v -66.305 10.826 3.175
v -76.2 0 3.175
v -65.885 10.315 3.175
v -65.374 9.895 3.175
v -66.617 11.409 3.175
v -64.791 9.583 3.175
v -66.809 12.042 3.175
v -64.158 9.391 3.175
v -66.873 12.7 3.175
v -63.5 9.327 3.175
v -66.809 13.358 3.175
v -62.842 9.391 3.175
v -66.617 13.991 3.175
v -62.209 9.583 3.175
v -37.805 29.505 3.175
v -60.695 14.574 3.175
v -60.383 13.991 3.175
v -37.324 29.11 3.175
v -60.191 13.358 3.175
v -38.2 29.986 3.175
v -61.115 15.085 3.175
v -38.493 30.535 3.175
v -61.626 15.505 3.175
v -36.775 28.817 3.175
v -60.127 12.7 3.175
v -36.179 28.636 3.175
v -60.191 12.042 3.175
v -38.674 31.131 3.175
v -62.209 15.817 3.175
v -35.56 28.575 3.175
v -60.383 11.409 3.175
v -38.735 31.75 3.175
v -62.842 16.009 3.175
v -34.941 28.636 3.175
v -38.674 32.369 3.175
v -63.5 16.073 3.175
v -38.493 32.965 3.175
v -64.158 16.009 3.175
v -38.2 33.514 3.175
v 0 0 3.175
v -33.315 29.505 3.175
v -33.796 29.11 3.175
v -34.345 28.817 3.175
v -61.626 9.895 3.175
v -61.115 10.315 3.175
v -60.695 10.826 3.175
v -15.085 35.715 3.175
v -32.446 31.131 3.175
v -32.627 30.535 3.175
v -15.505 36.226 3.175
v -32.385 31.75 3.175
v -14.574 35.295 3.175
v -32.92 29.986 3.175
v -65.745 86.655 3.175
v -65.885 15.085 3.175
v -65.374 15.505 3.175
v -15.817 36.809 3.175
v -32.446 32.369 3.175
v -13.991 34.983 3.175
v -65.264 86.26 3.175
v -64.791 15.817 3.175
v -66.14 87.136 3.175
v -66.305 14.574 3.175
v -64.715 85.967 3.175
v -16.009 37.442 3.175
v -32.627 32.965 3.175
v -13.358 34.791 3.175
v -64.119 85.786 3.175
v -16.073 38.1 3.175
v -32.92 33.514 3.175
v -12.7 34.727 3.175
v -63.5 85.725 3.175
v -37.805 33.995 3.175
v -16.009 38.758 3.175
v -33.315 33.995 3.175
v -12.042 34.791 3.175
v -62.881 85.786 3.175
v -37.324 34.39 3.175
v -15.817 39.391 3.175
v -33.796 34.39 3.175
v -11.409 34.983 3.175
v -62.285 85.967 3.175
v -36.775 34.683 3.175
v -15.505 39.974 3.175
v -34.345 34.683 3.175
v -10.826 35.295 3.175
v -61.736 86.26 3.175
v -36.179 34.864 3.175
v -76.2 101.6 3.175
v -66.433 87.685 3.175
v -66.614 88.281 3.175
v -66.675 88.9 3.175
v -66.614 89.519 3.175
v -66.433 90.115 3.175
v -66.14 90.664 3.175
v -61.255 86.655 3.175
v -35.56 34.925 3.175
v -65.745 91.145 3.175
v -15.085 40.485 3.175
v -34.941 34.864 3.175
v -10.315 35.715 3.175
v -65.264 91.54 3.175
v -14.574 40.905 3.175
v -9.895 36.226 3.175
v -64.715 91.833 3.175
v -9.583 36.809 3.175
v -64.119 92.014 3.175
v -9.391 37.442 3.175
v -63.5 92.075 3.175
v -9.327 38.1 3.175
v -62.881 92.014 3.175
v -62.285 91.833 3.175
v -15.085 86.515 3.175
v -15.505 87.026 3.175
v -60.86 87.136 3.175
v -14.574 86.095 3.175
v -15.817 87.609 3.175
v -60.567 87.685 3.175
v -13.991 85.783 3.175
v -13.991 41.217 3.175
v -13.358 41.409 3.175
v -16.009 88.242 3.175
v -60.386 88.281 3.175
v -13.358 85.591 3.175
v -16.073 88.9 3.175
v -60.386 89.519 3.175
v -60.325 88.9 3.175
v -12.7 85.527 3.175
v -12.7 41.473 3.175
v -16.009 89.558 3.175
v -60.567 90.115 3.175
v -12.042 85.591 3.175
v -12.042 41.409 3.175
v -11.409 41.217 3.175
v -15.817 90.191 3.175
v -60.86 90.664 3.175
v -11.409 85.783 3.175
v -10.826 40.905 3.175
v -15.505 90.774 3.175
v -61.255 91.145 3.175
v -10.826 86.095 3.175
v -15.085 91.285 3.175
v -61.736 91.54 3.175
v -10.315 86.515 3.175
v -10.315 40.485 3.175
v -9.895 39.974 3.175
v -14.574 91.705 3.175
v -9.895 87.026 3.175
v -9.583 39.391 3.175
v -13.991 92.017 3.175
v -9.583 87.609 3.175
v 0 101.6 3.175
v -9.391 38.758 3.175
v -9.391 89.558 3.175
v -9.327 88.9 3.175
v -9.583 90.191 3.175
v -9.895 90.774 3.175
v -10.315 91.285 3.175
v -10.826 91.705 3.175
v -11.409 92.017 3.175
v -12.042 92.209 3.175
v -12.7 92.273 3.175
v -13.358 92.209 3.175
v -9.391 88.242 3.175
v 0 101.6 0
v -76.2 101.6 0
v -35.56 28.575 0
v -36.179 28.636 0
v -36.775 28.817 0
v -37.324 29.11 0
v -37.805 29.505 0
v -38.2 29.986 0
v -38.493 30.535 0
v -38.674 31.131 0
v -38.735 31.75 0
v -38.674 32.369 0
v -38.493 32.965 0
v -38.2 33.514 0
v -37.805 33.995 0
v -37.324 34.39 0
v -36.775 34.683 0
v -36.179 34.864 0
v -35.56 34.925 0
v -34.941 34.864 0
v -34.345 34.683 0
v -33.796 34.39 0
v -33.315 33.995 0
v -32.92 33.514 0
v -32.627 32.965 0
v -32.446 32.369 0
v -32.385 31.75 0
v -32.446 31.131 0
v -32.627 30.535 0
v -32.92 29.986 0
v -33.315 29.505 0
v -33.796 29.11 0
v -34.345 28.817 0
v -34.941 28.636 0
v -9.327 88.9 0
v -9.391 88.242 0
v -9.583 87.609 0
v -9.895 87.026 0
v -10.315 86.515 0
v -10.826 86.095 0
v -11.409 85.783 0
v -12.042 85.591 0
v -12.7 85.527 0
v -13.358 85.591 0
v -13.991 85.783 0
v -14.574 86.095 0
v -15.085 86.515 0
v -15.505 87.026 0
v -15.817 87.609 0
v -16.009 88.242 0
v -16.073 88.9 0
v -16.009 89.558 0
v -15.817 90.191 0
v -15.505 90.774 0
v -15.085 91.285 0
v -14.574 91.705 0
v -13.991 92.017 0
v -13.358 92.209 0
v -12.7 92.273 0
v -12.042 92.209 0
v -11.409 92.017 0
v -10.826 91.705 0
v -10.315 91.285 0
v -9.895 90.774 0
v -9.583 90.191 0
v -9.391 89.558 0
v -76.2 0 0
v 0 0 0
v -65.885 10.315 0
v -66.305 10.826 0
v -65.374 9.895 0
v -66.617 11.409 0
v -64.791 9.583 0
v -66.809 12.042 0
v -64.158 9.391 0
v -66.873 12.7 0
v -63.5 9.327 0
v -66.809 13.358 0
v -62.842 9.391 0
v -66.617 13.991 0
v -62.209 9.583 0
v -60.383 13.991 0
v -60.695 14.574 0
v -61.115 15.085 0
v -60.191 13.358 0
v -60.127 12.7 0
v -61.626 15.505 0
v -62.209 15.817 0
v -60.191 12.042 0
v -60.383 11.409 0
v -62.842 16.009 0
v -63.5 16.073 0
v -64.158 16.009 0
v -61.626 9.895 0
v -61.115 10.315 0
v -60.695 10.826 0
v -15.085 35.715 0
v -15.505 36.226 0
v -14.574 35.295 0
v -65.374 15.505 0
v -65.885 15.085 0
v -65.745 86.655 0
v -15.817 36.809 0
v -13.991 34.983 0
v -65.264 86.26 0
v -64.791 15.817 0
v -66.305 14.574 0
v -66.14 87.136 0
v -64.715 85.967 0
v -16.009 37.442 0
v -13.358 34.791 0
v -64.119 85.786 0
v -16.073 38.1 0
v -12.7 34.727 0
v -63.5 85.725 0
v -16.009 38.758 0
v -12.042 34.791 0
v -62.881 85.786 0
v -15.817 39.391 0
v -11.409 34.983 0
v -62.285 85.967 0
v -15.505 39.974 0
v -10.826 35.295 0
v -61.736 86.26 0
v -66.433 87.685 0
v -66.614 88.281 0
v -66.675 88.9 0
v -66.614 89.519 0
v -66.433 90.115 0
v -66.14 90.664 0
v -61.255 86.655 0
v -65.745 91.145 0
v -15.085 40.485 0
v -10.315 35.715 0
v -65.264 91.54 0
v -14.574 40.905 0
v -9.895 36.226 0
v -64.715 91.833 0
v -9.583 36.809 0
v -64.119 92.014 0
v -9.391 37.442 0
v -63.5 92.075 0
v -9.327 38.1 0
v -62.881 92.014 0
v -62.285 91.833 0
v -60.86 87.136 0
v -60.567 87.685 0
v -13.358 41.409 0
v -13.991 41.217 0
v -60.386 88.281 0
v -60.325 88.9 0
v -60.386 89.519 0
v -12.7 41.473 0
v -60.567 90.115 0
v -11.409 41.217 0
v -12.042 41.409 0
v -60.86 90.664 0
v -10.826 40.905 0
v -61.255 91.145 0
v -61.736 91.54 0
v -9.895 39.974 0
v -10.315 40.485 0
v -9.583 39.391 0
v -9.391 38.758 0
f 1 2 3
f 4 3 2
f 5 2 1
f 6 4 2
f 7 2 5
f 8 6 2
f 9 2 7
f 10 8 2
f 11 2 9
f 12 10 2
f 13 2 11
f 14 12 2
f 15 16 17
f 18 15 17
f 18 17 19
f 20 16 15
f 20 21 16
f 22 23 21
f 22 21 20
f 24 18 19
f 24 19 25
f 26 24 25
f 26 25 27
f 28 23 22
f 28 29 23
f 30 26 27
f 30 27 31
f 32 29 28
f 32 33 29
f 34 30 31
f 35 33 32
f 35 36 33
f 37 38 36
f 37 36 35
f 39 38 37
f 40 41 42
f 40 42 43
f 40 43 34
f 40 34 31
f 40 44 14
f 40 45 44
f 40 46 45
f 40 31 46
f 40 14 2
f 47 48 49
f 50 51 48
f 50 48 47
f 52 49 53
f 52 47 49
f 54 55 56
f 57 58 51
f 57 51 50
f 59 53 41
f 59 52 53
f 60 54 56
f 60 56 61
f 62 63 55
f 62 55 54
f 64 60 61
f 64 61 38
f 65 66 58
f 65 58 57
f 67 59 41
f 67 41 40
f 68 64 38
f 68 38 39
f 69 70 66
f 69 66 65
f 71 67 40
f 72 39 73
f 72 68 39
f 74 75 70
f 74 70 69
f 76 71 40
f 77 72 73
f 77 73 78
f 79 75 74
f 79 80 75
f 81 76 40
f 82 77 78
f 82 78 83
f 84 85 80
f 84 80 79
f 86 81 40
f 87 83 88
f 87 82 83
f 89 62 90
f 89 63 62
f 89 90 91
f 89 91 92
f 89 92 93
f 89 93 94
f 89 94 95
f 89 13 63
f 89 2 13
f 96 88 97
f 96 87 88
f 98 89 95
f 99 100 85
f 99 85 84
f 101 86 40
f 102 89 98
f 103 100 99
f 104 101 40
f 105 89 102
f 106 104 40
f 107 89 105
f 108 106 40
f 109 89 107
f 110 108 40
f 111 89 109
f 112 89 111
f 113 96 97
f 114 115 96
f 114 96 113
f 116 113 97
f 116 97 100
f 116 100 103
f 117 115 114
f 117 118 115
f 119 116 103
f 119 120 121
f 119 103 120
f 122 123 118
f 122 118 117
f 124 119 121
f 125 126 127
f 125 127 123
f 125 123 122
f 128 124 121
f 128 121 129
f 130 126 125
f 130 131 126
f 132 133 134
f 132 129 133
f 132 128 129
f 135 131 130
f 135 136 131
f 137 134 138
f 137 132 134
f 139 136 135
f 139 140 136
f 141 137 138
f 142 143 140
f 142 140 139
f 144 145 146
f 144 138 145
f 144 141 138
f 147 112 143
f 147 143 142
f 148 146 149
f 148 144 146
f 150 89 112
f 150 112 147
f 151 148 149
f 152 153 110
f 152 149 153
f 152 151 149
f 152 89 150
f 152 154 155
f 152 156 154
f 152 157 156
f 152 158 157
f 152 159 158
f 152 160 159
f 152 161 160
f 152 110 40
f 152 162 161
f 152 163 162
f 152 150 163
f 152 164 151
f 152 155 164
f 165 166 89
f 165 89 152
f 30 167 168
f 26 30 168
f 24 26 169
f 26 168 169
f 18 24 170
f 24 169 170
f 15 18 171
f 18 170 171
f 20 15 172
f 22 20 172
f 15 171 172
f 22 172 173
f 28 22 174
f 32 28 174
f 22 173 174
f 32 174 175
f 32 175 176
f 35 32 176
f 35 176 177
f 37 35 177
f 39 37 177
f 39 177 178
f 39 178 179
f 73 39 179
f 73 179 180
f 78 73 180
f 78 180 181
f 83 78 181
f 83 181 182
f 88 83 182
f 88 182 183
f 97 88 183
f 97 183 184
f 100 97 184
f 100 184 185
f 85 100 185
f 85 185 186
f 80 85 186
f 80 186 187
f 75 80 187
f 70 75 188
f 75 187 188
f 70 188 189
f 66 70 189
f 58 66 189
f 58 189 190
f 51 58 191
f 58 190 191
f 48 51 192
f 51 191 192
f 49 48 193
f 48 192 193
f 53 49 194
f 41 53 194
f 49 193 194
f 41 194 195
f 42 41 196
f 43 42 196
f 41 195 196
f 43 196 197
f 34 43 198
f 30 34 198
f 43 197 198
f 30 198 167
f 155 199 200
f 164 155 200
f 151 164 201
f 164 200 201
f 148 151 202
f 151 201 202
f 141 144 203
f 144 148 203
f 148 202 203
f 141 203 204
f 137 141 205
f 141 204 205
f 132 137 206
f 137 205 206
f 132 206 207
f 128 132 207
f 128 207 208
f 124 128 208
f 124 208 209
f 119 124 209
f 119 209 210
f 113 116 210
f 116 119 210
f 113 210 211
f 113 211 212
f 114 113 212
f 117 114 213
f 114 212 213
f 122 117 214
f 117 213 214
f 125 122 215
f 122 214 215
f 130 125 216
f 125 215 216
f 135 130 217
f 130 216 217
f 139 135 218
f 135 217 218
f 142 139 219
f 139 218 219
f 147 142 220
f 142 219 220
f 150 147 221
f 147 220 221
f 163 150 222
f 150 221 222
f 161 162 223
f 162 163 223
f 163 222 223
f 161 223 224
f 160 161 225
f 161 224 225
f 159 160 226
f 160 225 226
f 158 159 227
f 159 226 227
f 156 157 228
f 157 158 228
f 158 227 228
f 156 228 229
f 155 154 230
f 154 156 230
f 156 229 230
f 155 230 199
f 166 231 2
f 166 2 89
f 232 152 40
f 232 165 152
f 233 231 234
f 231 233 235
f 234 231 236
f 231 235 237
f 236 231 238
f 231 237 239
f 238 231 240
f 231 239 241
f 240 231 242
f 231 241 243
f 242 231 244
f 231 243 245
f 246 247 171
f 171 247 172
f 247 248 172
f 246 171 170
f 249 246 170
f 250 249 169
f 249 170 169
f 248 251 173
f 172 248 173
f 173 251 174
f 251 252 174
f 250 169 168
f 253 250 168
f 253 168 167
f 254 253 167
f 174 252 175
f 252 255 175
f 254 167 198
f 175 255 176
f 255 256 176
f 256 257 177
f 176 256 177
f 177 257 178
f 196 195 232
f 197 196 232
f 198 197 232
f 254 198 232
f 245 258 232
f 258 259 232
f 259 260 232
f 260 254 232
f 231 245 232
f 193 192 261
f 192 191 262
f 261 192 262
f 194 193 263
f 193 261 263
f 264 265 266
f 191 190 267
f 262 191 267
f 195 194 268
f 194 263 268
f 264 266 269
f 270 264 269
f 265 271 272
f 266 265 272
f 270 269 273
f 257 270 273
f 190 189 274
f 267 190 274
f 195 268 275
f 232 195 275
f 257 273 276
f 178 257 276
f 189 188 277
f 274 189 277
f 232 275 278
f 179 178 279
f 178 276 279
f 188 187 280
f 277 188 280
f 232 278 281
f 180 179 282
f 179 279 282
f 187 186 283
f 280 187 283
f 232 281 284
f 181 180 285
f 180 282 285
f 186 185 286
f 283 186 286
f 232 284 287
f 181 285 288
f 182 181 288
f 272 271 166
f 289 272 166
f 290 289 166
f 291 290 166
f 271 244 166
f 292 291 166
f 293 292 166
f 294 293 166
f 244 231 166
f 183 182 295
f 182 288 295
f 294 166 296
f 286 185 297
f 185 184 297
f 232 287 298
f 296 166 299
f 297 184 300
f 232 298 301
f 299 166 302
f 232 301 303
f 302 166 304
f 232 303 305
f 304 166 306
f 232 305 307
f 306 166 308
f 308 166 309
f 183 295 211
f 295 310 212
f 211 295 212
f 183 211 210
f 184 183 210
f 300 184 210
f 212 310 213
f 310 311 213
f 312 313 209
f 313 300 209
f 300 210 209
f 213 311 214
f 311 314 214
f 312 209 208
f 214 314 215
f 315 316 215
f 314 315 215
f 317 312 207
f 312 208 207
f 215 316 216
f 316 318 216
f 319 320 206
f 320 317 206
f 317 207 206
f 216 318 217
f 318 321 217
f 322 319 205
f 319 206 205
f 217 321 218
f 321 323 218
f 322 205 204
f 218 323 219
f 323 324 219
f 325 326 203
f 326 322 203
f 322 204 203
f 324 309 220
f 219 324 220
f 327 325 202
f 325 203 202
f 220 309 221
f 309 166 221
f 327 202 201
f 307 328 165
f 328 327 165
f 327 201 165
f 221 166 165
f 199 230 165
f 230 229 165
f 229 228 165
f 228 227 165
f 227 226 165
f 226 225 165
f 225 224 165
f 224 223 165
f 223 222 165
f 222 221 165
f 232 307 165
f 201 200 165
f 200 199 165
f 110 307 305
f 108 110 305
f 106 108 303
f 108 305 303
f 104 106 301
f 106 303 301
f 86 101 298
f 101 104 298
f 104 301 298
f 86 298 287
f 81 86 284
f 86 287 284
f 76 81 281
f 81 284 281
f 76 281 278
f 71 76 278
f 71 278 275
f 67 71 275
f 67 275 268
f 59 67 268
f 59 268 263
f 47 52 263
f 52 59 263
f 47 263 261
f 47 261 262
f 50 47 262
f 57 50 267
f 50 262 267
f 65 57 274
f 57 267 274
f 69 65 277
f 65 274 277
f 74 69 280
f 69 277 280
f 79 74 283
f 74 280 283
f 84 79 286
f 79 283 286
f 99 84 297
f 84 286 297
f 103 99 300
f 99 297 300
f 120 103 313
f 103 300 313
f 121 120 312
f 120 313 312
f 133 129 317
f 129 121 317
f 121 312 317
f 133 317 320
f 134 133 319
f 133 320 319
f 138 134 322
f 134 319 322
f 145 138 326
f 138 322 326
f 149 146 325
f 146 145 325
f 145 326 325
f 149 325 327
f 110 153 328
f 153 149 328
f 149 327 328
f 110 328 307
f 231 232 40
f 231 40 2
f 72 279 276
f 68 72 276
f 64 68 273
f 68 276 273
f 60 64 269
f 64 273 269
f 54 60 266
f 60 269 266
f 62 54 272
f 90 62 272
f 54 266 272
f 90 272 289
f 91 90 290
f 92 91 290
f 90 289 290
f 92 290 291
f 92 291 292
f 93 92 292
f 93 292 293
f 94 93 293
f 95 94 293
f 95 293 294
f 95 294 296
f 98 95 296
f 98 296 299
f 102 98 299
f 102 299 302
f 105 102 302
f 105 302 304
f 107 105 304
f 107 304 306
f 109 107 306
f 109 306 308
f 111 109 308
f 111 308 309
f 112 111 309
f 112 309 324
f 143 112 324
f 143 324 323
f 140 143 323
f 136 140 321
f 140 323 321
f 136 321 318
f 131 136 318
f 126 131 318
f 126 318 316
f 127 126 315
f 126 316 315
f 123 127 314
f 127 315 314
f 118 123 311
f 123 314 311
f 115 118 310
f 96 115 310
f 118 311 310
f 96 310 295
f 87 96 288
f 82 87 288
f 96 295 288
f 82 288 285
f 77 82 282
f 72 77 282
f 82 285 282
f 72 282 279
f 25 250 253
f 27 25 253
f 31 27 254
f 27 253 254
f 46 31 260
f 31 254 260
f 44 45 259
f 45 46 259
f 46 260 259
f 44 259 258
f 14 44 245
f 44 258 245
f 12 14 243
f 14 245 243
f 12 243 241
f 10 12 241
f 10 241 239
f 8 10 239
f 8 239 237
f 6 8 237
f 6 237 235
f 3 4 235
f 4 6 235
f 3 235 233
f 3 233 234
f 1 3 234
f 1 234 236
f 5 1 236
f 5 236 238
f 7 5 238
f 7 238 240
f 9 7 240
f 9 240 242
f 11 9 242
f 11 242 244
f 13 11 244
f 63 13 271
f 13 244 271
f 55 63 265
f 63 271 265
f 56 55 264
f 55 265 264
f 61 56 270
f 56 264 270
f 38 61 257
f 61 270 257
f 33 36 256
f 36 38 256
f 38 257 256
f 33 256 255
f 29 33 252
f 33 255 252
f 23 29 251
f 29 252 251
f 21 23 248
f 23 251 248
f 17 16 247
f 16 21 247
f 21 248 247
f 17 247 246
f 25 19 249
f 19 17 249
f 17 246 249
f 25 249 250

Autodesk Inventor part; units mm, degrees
ref_plane "YZ Plane" through (0, 0, 0) normal (1, 0, 0) x (0, 1, 0)
ref_plane "XZ Plane" through (0, 0, 0) normal (0, 1, 0) x (-1, 0, 0)
ref_plane "XY Plane" through (0, 0, 0) normal (0, 0, 1) x (1, 0, 0)
sketch "Sketch1" plane through (0, 0, 0) normal (0, 0, 1) x (1, 0, 0)
  line L0 (0, 0) -> (-76.2, 0)
  line L1 (-76.2, 0) -> (-76.2, 101.6)
  line L2 (-76.2, 101.6) -> (0, 101.6)
  line L3 (0, 101.6) -> (0, 0)
  circle A0 centre (-12.7, 88.9) radius 3.3734
  circle A1 centre (-12.7, 38.1) radius 3.3734
  circle A2 centre (-63.5, 12.7) radius 3.3734
  dimension "d0" = 76.2
  dimension "d1" = 101.6
  dimension "d2" = 6.7469
  dimension "d3" = 12.7
  dimension "d4" = 12.7
  dimension "d5" = 38.1
  dimension "d6" = 12.7
  dimension "d7" = 12.7
  dimension "d8" = 12.7
extrude "Extrusion1" add sketch "Sketch1" along normal blind 3.175
sketch "Sketch2" plane through (0, 0, 3.175) normal (0, 0, 1) x (1, 0, 0)
  line L0 (-76.2, 101.6) -> (-76.2, 0) projected
  line L1 (-76.2, 101.6) -> (0, 101.6) projected
  point P0 (0, 0)
  point P1 (-63.5, 88.9)
  point P2 (-35.56, 31.75)
  dimension "d11" = 12.7
  dimension "d12" = 40.64
  dimension "d13" = 12.7
  dimension "d14" = 57.15
hole "Hole1" at (-63.5, 88.9, 3.175) at (-35.56, 31.75, 3.175) direction (0, 0, -1) diameter 6.35 end through all
properties part number "15102898-16-P-0220"
